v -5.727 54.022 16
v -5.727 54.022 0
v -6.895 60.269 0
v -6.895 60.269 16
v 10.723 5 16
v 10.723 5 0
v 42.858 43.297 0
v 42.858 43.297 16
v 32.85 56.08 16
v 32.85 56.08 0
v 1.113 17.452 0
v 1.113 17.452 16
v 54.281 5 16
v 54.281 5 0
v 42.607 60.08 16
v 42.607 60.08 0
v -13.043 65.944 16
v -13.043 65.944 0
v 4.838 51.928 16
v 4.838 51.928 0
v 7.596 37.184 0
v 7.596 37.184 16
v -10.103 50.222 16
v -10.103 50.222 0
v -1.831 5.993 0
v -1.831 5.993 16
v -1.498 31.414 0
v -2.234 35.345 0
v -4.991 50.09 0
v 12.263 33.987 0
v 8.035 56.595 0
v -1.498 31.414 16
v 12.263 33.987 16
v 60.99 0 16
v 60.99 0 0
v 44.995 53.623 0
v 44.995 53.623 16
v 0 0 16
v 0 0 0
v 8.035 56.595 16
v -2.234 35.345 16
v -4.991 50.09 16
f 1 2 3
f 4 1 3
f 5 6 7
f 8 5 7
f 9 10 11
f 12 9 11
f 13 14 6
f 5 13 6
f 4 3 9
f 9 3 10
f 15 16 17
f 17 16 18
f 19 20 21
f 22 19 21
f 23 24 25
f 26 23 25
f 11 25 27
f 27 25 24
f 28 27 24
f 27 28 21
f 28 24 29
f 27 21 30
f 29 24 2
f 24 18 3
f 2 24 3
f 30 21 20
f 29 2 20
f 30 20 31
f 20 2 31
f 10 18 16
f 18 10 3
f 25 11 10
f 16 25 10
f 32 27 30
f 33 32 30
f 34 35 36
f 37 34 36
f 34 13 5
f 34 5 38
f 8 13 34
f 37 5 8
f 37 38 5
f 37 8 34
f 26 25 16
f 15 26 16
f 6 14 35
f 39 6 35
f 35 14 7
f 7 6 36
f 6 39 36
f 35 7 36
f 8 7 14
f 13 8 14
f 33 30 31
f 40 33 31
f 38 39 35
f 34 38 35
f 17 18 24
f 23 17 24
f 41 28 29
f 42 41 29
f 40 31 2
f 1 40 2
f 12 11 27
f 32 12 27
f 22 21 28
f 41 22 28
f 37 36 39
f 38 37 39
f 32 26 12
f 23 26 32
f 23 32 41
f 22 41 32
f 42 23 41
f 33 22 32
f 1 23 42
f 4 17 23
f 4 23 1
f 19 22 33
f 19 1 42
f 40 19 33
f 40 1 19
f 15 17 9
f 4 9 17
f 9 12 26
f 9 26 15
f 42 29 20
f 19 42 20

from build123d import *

# Parameters (mm, degrees)
F1_DEPTH = 16


with BuildPart() as f1:
    # F0 (on Top) → F1 (new body)
    with BuildSketch(Plane.XY):
        Polygon((-1.8307172417, 5.993409444), (42.6066645263, 60.0796285909), (-13.0430408452, 65.9442169097), (-10.1025255134, 50.2216713659), align=None)
        Polygon((-2.2335933527, 35.3454163541), (-4.9911610426, 50.0897651168), (4.8384047992, 51.9281435767), (7.5959724891, 37.183794814), align=None, mode=Mode.SUBTRACT)
        Polygon((-6.8948634806, 60.268609607), (32.8495603914, 56.0801834074), (1.1128580143, 17.4523846606), (-1.4982419687, 31.4135900174), (12.2631502098, 33.9873198613), (8.034879752, 56.5953212974), (-5.7265124265, 54.0215914535), align=None, mode=Mode.SUBTRACT)
    extrude(amount=F1_DEPTH)


with BuildPart() as f1b:
    # F0 (on Top) → F1, piece 2 (new body)
    with BuildSketch(Plane.XY):
        Polygon((44.9951326781, 53.6231110183), (0, 0), (44.9951326781, 0), (60.9902903451, 0), align=None)
        Polygon((10.7225346025, 5), (42.8575767091, 43.2970518787), (54.2811470942, 5), align=None, mode=Mode.SUBTRACT)
    extrude(amount=F1_DEPTH)


solid = Compound([f1.part, f1b.part])
